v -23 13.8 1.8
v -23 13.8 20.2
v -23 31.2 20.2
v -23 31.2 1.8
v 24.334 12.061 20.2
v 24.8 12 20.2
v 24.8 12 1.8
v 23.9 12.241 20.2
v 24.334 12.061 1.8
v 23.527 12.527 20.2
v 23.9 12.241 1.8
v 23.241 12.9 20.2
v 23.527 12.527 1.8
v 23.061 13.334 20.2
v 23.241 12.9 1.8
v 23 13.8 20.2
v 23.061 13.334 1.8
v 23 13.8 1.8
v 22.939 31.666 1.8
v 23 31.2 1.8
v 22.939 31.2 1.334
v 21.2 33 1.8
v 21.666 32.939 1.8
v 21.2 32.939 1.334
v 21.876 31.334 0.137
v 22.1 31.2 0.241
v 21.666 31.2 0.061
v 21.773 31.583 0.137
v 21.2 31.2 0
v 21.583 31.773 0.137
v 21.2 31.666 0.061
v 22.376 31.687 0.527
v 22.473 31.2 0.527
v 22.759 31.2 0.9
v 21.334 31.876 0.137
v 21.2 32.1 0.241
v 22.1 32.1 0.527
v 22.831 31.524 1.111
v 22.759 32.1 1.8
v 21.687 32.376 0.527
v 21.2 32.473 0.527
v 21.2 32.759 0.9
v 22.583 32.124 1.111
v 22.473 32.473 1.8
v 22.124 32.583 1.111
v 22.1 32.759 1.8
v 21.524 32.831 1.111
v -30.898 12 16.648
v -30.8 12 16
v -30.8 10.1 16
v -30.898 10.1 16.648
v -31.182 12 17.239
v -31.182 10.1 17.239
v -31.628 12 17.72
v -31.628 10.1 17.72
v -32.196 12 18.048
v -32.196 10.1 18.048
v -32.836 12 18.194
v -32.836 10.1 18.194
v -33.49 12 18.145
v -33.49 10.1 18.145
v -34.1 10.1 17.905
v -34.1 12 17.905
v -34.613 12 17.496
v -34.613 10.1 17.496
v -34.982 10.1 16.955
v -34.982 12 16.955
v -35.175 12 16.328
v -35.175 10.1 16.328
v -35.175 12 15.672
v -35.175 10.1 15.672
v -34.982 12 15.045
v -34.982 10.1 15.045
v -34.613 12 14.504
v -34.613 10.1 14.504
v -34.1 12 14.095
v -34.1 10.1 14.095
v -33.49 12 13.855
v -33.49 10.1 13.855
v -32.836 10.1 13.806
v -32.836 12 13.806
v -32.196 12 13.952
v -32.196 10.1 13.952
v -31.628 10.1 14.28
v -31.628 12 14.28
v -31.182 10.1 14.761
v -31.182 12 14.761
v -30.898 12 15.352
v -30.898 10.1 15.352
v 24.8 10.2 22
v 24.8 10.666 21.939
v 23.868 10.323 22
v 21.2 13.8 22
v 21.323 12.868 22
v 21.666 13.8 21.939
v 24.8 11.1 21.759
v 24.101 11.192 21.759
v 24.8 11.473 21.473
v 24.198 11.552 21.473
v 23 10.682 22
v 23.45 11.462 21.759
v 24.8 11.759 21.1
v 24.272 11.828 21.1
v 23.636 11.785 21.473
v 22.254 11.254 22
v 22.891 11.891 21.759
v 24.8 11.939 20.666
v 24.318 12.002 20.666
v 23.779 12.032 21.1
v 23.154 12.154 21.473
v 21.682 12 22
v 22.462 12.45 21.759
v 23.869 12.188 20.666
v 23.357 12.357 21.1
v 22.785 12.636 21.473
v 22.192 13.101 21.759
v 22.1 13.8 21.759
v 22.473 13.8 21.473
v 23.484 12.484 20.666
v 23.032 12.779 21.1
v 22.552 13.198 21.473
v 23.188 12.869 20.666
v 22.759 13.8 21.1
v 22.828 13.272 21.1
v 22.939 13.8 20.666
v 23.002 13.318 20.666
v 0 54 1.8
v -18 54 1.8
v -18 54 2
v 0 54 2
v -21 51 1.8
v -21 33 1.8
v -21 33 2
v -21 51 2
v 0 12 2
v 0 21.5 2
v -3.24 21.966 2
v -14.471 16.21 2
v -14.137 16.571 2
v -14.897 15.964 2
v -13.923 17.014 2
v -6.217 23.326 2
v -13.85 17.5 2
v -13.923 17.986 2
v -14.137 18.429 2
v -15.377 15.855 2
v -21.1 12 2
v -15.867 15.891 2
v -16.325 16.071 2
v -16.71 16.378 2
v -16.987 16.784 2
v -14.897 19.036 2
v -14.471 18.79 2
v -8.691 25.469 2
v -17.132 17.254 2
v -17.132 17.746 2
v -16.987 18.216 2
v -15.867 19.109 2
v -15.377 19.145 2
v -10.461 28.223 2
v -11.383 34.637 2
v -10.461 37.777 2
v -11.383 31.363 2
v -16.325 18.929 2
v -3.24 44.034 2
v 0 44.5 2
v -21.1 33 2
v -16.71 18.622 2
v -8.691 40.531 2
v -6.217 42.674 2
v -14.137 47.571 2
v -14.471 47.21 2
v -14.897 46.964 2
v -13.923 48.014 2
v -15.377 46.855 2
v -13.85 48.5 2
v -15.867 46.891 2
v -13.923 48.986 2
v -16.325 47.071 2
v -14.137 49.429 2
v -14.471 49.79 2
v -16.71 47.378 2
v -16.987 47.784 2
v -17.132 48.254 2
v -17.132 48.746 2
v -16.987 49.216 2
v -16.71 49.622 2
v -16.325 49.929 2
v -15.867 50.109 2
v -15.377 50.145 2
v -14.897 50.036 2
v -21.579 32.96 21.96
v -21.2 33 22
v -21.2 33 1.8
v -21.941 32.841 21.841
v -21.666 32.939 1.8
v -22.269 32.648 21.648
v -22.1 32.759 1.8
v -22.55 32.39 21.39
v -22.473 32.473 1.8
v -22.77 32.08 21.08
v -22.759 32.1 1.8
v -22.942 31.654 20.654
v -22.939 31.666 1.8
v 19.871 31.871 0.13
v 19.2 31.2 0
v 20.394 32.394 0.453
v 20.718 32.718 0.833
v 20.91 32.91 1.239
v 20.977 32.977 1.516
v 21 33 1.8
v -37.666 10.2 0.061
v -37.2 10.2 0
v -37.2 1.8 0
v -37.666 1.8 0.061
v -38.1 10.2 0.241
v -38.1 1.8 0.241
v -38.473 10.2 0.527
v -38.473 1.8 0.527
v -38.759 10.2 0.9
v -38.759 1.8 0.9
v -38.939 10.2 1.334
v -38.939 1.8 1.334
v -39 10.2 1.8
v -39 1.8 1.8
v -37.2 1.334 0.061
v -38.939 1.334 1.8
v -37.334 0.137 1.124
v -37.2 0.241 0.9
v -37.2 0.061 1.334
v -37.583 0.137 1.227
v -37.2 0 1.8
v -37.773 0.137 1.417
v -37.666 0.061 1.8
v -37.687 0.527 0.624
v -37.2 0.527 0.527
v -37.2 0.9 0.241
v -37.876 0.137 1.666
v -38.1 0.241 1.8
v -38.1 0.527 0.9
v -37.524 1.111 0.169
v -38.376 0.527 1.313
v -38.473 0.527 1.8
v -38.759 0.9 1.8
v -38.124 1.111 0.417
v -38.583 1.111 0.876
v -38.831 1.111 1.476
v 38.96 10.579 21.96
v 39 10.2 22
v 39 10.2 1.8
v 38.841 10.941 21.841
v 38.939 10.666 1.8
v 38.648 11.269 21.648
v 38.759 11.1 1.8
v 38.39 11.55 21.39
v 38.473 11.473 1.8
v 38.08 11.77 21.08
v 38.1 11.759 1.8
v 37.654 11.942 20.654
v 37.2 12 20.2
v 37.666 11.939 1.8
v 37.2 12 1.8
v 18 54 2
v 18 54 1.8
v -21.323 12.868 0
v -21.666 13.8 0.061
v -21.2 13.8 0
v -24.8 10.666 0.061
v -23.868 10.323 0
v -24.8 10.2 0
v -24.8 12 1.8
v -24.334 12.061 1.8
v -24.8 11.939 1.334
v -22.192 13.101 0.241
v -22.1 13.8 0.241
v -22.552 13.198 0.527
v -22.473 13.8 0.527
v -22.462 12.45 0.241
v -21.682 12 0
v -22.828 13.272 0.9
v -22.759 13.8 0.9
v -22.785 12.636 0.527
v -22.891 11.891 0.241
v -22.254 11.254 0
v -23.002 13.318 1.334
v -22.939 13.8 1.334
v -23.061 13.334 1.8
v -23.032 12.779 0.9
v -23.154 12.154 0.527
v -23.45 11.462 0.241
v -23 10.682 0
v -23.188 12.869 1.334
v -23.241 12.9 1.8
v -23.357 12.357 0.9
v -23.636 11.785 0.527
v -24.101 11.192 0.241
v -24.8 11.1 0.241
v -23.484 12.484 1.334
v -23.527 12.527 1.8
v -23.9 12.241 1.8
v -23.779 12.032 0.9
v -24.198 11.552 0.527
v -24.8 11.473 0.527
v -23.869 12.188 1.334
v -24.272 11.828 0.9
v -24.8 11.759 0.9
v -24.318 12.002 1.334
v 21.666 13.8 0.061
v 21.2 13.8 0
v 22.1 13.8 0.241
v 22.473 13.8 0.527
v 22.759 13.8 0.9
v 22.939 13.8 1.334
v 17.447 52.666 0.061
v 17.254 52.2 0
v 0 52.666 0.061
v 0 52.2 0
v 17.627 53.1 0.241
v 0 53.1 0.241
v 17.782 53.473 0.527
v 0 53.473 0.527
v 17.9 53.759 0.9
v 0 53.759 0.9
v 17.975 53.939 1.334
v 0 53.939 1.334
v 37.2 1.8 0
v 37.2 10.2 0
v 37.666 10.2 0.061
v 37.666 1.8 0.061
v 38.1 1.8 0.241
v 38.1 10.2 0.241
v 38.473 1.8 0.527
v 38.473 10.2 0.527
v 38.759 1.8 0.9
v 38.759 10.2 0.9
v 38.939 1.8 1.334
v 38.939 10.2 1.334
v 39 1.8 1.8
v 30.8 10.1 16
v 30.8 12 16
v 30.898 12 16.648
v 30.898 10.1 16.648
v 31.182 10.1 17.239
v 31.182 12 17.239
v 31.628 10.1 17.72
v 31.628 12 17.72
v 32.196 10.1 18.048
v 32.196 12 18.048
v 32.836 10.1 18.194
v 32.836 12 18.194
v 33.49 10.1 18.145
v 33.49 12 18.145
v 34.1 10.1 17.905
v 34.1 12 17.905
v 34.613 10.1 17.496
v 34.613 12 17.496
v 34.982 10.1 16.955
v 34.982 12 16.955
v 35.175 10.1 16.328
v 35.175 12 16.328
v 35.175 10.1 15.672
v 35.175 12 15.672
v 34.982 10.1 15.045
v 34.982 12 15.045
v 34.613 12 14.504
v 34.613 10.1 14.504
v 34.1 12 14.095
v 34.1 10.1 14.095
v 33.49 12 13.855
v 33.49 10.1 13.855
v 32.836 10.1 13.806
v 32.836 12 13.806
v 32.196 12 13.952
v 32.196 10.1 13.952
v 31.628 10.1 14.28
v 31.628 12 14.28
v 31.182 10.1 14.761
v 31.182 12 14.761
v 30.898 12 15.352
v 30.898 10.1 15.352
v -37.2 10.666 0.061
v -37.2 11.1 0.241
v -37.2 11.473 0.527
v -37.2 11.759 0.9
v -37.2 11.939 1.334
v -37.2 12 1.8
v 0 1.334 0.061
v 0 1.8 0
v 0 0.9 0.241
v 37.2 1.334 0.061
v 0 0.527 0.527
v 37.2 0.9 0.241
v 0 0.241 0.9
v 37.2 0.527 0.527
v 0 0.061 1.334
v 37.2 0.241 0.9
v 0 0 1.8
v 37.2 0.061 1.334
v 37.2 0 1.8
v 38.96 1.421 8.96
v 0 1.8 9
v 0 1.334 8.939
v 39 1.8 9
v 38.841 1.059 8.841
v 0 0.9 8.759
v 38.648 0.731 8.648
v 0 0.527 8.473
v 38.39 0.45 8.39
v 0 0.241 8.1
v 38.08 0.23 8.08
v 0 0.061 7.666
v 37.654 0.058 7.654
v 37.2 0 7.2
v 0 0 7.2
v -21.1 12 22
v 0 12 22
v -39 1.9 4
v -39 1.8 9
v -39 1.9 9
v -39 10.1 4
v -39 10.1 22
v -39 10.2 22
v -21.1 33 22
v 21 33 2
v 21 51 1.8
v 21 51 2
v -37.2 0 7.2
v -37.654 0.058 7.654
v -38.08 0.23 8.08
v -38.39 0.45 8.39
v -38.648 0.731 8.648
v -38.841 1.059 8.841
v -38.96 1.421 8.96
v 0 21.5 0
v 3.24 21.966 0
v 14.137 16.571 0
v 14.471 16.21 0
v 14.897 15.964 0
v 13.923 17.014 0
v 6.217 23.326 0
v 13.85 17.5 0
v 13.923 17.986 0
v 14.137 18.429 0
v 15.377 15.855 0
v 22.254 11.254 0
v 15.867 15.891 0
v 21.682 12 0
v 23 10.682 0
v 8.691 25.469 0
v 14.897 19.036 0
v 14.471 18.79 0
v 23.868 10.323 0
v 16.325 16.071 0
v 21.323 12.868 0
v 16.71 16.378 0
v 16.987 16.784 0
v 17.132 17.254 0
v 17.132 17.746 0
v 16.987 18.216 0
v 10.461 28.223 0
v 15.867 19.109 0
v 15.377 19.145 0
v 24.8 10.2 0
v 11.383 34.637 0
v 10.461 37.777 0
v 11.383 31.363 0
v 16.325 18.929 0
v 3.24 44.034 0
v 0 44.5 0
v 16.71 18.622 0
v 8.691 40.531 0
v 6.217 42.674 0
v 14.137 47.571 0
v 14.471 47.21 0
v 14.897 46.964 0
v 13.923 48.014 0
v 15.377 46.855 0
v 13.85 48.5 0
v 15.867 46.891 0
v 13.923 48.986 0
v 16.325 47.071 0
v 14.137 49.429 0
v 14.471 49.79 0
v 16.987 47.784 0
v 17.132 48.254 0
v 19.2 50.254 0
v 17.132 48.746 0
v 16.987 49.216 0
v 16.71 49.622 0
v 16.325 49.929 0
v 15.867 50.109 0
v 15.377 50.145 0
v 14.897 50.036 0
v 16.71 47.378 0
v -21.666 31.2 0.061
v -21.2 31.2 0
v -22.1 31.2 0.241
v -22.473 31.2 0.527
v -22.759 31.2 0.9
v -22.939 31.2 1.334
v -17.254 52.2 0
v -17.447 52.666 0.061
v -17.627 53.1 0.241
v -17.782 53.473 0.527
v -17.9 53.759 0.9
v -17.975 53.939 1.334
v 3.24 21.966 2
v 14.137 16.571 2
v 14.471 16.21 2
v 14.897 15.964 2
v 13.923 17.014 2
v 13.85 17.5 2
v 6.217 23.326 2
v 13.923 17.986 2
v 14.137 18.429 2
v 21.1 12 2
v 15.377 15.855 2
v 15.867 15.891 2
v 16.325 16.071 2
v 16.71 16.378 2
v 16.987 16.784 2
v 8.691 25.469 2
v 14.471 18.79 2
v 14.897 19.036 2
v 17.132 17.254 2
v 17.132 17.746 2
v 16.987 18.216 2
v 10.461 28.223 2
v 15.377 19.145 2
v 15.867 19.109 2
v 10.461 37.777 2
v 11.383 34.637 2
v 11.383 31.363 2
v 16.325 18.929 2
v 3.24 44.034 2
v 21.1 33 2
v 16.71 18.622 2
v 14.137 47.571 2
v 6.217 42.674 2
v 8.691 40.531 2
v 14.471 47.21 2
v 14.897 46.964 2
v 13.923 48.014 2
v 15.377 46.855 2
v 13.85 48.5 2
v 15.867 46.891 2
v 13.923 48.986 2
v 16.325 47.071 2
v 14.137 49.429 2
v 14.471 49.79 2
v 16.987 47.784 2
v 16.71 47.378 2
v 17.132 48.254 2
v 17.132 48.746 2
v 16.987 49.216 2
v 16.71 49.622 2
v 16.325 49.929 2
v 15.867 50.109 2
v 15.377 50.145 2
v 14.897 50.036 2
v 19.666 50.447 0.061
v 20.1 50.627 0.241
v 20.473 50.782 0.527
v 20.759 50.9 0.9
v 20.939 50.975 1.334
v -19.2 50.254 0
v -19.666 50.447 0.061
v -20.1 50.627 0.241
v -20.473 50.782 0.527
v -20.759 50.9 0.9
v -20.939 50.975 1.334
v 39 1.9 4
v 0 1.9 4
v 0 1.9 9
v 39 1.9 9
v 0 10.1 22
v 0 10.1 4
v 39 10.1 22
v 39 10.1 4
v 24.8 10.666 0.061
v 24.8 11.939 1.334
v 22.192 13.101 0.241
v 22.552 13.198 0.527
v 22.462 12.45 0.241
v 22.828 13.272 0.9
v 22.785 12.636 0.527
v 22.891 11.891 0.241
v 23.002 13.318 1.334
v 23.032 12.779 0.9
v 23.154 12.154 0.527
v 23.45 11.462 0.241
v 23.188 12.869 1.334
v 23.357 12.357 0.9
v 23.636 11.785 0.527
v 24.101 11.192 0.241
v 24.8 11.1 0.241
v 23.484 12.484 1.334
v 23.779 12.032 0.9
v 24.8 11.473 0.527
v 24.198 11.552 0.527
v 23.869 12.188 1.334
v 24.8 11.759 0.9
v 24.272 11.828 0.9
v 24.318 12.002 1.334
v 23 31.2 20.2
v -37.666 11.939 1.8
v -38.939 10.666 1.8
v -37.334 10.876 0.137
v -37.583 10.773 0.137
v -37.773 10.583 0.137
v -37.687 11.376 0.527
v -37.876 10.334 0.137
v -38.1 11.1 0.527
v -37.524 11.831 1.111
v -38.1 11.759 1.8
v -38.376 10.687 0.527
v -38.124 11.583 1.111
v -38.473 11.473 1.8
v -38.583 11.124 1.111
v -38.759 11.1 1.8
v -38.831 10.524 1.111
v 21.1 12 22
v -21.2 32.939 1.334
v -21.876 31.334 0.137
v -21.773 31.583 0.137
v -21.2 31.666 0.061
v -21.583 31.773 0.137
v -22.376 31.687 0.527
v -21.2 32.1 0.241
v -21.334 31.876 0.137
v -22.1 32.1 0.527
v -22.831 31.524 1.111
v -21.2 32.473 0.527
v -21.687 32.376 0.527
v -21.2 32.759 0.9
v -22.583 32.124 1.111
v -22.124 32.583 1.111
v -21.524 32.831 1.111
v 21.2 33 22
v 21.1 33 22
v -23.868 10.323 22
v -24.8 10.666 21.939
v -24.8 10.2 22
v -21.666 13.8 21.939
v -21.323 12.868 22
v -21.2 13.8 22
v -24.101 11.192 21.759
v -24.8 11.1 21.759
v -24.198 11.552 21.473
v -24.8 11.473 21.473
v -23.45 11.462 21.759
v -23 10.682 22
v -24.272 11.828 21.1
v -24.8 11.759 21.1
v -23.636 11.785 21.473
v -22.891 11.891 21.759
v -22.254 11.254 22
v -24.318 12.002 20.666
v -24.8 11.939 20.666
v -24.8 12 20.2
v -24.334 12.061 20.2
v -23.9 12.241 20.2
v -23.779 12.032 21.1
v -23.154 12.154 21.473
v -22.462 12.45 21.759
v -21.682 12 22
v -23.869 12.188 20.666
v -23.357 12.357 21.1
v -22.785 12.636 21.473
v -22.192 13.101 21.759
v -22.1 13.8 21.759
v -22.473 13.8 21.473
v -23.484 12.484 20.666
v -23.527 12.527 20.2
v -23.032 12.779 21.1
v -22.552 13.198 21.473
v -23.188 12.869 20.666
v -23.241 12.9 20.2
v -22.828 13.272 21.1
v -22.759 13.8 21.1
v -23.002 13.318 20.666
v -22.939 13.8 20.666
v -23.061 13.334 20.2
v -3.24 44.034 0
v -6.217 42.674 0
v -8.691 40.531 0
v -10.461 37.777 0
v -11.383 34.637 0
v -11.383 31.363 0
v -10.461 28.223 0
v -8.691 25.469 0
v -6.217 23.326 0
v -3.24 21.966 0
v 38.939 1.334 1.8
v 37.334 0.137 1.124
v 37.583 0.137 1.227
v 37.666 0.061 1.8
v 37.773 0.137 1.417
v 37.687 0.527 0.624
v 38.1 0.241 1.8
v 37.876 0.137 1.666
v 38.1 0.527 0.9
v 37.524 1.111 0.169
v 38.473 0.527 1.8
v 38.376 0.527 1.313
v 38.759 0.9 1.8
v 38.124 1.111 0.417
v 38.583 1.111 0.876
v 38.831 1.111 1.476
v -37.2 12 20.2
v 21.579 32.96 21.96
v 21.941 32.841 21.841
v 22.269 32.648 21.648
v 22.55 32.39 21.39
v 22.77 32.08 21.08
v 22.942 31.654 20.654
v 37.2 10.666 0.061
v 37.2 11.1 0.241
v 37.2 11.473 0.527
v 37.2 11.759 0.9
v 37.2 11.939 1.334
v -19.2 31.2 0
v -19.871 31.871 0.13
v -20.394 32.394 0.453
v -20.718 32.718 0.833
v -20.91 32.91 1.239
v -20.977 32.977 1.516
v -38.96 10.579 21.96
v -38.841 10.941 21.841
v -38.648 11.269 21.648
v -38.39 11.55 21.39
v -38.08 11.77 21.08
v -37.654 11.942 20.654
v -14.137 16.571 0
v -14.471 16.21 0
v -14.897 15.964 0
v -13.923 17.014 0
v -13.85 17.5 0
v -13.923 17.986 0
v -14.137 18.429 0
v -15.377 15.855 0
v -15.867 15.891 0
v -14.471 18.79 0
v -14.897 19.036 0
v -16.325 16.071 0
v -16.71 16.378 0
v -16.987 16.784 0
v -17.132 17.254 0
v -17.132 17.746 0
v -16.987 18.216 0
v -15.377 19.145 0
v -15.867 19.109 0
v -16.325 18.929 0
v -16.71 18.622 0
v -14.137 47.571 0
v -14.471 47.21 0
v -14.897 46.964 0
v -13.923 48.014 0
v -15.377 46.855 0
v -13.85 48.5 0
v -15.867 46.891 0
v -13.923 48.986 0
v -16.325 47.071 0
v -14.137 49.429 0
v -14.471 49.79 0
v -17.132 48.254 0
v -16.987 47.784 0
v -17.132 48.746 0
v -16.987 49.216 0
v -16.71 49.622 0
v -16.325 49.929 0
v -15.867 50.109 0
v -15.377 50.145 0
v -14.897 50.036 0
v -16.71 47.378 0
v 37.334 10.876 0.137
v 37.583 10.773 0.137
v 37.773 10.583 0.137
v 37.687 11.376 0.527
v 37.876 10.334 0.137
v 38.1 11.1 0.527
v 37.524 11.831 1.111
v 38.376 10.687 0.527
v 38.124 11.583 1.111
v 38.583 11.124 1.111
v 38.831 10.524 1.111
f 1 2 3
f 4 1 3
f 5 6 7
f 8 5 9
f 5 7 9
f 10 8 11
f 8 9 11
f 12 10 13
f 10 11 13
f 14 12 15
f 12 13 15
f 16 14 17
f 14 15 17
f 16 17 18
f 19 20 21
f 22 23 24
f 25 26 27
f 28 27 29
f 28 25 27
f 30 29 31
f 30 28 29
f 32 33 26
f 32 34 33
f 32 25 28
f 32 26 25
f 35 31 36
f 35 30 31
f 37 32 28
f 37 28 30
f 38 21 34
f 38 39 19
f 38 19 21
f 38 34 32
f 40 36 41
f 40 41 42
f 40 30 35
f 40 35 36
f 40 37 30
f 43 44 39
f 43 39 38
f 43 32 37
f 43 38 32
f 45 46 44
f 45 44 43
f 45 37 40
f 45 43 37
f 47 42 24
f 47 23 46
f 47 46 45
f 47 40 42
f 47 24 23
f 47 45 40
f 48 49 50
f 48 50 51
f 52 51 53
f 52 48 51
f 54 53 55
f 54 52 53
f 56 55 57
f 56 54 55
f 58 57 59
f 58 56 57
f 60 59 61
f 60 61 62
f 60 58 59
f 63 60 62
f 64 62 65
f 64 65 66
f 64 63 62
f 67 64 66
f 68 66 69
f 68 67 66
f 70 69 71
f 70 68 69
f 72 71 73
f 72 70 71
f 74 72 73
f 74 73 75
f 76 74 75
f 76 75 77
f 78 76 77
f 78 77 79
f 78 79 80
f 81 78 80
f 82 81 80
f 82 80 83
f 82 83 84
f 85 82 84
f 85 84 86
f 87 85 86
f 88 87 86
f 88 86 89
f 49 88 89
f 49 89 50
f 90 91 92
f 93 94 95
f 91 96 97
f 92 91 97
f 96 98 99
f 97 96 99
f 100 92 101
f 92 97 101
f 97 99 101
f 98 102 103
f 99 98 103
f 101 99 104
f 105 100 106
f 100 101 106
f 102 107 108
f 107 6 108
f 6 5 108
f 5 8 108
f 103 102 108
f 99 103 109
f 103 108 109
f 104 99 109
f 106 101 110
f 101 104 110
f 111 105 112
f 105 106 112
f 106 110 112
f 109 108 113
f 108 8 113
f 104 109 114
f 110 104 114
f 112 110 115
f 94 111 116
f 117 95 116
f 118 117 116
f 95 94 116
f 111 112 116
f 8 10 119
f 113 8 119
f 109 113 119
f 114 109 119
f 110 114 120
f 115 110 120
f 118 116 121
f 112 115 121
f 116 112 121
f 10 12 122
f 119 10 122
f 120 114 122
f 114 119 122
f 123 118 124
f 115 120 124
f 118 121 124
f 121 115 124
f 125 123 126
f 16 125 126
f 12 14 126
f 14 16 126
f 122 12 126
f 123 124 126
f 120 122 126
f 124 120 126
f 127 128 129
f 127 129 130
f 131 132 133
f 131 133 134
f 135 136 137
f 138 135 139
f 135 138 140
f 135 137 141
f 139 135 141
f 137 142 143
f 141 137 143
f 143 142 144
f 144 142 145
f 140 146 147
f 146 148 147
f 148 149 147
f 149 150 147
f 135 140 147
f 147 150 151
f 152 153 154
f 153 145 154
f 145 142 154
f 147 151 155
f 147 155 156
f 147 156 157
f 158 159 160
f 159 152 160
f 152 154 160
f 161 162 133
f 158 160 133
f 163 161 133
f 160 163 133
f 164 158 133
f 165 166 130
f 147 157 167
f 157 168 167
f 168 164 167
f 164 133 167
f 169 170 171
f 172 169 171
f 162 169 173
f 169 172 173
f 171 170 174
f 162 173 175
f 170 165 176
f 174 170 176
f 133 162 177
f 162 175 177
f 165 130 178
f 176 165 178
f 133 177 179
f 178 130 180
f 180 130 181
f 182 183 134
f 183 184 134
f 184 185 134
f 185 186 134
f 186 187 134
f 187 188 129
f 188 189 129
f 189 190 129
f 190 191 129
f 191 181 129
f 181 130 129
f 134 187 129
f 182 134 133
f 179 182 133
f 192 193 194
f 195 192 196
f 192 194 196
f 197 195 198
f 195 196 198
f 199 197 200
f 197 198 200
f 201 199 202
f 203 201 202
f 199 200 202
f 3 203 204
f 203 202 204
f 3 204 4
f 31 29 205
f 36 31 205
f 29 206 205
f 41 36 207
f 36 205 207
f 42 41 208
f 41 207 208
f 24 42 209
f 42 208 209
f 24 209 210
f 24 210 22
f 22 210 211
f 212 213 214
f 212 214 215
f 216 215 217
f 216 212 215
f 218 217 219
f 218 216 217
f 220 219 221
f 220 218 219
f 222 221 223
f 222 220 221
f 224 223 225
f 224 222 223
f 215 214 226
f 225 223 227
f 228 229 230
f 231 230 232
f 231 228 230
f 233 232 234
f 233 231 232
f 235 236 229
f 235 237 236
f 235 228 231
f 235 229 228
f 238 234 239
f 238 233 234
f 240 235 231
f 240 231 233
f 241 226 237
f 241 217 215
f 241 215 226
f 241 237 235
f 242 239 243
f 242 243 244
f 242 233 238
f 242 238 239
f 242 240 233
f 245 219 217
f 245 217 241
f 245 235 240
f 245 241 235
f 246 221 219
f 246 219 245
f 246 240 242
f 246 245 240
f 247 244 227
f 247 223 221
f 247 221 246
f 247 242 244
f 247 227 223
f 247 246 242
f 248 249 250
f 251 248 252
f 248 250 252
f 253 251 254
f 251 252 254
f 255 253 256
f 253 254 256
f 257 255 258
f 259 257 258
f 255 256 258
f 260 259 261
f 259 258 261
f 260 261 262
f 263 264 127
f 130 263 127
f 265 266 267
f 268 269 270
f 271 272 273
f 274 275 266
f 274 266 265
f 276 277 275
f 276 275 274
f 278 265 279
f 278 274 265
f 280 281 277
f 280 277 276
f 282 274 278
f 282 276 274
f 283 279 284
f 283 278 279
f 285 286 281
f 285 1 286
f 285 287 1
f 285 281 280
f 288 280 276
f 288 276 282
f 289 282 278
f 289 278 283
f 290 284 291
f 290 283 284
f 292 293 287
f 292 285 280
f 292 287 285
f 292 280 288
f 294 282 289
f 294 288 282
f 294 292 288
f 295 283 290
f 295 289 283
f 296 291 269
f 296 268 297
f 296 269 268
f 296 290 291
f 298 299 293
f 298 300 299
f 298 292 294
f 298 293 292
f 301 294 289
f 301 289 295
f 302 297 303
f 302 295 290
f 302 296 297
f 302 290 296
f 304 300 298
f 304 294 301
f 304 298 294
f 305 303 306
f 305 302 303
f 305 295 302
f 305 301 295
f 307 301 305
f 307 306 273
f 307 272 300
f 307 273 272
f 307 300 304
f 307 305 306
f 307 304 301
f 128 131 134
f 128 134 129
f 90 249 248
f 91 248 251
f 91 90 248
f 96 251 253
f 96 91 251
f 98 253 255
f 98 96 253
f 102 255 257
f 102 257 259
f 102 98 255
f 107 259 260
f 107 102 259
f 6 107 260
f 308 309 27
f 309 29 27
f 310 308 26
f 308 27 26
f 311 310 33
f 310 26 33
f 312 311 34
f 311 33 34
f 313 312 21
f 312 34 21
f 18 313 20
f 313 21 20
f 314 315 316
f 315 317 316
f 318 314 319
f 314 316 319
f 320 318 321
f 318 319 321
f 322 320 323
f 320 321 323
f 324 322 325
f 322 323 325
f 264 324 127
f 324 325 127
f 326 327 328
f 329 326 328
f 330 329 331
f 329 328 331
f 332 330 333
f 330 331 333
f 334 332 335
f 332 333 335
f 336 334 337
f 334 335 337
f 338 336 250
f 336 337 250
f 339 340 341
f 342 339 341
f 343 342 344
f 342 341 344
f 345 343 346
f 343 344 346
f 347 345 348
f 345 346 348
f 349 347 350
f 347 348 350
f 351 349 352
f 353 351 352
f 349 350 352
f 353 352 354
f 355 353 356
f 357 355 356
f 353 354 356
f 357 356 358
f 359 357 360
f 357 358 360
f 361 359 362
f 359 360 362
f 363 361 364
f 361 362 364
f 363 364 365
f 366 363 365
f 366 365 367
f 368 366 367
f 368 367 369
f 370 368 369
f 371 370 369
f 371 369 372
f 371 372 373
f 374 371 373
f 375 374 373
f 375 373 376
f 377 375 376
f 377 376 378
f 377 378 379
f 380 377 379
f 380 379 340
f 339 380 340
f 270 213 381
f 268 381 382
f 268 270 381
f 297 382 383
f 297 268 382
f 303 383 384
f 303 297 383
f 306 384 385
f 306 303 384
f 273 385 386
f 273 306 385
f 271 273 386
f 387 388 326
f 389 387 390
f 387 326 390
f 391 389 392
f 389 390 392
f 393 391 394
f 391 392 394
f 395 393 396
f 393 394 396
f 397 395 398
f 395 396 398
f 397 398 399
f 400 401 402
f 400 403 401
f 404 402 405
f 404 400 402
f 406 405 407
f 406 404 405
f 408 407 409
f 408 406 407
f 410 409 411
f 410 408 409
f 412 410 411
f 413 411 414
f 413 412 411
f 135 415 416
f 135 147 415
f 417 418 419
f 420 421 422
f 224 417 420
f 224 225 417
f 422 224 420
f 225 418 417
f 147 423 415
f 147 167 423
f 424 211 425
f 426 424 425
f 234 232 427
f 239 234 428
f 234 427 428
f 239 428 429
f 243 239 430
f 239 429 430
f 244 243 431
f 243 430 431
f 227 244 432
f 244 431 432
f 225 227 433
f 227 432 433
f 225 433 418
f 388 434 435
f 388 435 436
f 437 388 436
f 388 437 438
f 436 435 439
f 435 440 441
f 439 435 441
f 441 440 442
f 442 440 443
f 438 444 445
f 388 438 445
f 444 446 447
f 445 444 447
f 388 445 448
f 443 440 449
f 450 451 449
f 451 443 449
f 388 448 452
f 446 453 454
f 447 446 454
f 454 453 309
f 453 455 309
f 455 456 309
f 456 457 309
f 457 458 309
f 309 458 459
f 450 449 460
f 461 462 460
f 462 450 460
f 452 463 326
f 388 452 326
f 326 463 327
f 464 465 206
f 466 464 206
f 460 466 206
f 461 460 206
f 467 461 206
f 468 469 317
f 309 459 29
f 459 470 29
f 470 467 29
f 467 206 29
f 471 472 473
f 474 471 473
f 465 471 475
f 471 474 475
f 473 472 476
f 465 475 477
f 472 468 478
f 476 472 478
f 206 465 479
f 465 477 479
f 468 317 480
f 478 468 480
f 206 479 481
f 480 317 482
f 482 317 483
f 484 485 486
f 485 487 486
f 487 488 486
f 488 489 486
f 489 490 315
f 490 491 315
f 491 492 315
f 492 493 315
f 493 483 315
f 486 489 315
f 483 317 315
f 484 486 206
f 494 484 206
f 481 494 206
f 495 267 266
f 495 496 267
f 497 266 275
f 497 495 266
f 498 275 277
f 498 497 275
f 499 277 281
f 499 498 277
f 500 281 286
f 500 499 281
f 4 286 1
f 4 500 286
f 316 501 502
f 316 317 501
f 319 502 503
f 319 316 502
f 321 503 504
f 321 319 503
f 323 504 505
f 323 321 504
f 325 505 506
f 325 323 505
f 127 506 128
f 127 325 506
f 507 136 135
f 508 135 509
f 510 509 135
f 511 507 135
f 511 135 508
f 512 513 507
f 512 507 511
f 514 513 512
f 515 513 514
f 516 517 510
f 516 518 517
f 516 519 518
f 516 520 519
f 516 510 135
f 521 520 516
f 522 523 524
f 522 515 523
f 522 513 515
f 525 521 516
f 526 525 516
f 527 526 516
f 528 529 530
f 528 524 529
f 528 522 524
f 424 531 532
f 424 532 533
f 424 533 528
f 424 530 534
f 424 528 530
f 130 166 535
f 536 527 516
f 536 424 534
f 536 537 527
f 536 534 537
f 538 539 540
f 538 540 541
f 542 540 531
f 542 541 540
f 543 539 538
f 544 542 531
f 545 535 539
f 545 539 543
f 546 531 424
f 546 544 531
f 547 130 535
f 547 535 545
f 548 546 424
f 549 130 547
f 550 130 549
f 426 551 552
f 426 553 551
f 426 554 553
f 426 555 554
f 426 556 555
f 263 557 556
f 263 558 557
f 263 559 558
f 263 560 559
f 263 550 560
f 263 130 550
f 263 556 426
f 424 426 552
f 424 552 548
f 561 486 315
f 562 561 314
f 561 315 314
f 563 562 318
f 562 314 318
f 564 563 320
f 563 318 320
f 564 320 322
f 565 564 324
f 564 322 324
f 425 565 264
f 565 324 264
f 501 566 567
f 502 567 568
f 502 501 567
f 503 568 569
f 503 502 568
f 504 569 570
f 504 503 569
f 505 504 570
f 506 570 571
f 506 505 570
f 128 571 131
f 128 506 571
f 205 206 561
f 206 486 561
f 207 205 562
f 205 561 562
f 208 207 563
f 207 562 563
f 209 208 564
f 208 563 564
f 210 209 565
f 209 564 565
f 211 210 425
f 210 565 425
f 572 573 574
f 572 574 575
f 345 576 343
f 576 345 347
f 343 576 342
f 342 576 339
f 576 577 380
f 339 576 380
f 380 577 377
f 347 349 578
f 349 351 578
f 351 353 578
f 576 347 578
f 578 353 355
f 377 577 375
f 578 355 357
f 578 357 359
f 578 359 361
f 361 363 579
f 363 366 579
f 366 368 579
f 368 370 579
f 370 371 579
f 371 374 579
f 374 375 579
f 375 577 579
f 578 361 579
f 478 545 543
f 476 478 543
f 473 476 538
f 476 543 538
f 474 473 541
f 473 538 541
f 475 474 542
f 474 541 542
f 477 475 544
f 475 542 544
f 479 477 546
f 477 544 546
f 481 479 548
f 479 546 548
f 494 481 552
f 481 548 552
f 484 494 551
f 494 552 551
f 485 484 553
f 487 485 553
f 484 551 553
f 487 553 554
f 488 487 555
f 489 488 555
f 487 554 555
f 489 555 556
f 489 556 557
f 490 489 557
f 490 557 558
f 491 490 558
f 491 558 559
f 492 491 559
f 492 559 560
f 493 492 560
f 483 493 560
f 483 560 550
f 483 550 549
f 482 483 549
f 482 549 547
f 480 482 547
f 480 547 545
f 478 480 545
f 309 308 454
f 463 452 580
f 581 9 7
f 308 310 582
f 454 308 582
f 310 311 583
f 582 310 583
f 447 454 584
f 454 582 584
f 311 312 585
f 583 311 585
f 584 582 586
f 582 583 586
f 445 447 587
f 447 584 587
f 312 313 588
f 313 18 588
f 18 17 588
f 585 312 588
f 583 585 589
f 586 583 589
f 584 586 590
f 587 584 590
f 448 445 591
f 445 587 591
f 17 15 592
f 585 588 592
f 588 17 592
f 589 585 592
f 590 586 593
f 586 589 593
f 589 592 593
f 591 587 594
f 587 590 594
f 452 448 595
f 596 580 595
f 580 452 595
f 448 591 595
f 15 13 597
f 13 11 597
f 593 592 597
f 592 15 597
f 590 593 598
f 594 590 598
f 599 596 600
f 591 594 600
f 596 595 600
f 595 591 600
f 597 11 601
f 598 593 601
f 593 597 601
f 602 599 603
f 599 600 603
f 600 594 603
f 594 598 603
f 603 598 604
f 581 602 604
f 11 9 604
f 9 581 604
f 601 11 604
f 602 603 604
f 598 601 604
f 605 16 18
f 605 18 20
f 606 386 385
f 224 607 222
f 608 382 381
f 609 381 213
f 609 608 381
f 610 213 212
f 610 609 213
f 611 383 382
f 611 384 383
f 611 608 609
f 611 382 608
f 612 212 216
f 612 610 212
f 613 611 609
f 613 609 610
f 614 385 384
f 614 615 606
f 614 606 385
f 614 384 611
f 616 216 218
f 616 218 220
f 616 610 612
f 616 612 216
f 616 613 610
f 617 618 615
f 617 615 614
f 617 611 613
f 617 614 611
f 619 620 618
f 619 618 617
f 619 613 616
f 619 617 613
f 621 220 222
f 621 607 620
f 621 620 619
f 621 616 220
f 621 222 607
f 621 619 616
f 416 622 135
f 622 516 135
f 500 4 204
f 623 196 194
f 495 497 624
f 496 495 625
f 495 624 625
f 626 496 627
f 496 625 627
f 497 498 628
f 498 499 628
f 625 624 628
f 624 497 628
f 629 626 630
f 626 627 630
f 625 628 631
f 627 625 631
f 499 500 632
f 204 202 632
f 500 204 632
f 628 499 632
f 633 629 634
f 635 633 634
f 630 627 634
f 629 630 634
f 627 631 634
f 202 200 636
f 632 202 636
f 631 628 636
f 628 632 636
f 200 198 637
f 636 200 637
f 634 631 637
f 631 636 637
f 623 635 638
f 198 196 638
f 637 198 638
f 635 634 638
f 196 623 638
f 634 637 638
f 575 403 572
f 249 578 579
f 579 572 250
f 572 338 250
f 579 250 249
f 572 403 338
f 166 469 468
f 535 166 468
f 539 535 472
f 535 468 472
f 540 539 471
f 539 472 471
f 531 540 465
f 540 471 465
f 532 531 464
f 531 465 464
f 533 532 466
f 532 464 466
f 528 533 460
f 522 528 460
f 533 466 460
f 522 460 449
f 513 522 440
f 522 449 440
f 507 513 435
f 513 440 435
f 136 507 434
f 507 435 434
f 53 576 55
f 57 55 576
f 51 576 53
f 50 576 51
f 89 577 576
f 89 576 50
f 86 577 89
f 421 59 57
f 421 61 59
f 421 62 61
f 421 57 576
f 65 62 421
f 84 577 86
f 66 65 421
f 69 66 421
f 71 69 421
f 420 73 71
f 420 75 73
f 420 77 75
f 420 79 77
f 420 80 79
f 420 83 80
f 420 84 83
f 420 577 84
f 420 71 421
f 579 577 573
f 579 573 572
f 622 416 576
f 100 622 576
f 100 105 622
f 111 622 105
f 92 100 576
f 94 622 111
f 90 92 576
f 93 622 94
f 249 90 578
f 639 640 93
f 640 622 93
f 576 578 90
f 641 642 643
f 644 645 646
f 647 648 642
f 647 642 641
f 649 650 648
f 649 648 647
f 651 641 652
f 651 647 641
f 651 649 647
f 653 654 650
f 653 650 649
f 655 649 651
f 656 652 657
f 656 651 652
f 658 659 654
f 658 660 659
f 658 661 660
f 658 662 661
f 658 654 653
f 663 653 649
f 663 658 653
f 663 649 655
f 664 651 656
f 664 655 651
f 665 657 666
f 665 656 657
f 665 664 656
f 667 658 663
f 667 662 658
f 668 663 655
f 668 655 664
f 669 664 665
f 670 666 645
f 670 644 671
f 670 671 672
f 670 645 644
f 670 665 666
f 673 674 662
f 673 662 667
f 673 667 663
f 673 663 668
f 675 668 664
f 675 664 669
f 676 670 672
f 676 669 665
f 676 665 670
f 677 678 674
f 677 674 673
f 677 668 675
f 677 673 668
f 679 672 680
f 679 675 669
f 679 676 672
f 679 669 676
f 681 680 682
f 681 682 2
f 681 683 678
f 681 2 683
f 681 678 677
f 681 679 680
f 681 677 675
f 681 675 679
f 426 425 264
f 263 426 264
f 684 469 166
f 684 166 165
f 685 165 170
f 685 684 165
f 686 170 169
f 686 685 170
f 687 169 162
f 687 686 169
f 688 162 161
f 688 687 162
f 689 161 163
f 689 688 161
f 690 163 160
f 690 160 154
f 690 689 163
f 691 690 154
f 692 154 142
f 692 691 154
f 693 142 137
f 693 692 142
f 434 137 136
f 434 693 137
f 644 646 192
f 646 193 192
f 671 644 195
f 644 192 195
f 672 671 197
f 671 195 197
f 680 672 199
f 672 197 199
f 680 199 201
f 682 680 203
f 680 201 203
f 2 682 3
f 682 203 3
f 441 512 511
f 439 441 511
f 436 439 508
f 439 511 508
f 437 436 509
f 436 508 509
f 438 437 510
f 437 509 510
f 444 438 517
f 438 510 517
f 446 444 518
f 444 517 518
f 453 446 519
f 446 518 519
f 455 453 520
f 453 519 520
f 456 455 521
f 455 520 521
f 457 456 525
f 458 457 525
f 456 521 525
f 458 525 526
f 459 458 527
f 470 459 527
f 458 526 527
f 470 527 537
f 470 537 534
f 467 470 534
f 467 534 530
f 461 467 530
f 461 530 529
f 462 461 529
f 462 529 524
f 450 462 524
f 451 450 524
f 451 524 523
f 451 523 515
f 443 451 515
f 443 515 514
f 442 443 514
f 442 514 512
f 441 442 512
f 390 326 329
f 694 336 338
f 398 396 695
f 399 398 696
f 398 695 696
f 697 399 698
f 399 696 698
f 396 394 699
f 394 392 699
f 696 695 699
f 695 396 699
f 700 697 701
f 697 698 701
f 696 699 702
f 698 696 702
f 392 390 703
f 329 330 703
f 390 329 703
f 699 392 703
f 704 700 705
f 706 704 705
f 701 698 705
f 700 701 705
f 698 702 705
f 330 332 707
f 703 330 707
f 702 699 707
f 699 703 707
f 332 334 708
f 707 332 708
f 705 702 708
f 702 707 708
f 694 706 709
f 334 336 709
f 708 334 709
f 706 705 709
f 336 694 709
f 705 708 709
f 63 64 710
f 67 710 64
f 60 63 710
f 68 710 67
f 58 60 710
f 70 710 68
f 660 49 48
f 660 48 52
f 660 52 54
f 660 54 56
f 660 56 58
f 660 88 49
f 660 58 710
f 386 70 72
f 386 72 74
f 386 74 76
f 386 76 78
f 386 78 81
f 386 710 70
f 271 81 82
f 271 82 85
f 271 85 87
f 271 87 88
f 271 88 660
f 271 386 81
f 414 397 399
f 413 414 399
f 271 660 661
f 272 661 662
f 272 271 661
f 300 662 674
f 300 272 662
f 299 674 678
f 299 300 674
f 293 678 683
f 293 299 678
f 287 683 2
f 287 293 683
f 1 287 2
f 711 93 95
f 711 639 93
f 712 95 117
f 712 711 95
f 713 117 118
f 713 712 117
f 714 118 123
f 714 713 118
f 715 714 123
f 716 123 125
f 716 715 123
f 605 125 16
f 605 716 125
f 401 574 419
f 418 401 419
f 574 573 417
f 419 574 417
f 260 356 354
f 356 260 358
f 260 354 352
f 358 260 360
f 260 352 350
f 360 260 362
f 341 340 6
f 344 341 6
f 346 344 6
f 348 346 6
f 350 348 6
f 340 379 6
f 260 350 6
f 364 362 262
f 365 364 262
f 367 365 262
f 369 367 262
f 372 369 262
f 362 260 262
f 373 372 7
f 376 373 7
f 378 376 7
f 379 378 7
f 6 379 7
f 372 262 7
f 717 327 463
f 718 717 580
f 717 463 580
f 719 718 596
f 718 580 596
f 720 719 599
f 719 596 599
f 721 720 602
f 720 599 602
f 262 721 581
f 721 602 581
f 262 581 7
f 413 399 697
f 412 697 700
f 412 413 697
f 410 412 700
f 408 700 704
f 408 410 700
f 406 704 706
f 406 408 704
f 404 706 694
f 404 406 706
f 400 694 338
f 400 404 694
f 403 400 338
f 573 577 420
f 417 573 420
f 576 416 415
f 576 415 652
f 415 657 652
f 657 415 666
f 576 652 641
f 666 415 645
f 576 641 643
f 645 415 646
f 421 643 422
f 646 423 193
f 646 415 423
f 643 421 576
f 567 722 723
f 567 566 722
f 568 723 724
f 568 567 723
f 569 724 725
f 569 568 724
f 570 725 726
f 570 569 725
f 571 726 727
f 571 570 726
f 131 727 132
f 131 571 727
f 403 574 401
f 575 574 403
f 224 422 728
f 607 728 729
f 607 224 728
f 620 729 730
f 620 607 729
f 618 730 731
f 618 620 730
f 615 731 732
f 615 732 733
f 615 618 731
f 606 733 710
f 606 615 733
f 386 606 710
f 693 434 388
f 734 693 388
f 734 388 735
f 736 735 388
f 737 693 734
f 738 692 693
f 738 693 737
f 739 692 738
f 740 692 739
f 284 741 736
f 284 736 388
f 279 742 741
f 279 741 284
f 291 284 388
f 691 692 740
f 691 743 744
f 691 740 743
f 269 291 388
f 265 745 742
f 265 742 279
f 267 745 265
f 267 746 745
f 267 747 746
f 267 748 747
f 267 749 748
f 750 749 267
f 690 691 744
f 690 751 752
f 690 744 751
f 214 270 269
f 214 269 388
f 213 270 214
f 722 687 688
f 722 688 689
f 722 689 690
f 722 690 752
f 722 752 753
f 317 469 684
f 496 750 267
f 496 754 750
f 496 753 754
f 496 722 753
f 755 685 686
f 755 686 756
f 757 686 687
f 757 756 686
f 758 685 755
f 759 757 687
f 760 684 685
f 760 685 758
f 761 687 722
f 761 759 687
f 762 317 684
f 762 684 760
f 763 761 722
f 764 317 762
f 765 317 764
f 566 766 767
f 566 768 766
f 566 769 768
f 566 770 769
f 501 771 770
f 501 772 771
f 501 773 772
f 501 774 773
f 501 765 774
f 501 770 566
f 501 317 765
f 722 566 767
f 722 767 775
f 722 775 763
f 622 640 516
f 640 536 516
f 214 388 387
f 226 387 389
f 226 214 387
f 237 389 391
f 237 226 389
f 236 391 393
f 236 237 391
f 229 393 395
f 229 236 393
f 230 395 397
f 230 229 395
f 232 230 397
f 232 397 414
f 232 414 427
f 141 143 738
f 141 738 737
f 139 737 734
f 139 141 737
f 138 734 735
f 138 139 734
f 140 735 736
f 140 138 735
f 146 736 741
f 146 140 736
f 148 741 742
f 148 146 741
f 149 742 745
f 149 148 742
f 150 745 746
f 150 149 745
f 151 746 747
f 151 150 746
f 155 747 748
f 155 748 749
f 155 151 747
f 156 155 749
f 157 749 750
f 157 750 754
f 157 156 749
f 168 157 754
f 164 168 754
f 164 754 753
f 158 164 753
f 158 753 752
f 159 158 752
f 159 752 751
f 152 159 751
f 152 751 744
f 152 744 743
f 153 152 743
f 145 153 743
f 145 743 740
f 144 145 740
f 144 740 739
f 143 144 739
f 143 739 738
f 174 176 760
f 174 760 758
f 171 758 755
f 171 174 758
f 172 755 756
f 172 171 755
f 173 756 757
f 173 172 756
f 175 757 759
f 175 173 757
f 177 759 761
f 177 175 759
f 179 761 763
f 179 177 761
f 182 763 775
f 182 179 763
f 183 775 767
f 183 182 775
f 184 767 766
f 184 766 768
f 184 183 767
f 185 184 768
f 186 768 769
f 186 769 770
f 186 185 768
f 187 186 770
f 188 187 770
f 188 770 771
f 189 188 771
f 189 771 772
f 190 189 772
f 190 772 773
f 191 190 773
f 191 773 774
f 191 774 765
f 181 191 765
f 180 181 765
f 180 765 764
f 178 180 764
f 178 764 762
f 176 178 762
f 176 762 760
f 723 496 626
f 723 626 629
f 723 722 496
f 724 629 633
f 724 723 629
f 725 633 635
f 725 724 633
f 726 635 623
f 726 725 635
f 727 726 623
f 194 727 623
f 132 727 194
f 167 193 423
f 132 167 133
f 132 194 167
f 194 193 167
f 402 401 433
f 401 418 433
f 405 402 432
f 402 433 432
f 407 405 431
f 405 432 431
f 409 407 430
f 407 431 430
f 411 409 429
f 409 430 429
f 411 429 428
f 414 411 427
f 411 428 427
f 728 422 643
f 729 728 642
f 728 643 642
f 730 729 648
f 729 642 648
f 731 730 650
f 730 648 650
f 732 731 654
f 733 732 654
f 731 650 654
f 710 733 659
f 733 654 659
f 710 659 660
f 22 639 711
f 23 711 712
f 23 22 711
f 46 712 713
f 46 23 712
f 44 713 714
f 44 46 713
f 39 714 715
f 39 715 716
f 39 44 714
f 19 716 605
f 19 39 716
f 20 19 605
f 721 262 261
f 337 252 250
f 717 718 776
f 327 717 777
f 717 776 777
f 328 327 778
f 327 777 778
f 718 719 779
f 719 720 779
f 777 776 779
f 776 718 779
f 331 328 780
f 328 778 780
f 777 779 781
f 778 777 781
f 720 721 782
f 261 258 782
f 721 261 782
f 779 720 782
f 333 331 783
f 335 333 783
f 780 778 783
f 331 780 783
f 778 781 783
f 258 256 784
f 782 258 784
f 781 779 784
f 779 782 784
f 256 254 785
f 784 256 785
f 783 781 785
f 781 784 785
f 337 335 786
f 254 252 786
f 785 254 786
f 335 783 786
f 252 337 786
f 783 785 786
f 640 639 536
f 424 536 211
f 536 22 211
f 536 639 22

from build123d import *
from build123d import SkipClean  # not in build123d's __all__

# Parameters (mm, degrees)
F1_DEPTH  = 2
F3_DEPTH  = 2
F5_DEPTH  = 18
F6_W      = 39
F6_H      = 1.9
F7_DEPTH  = 5
F9_D      = 3.3
F9_DEPTH  = 8
F9_TIP    = 0.9914200214
F11_D     = 4.4
F11_DEPTH = 8
F11_TIP   = 1.3218933619
F12_R     = 1.8


with BuildPart() as f1:
    # F0 (on Top) → F1 (new body)
    with BuildSketch(Plane.XY):
        with BuildLine():
            Line((0, 21.5), (0, 0))
            Line((0, 0), (39, 0))
            Line((39, 0), (39, 12))
            Line((39, 12), (23, 12))
            Line((23, 12), (23, 33))
            Line((23, 33), (21, 33))
            Line((21, 33), (21, 51))
            Line((21, 51), (18, 54))
            Line((18, 54), (0, 54))
            Line((0, 54), (0, 44.5))
            ThreePointArc((0, 44.5), (11.5, 33), (0, 21.5))
        make_face()
    extrude(amount=F1_DEPTH)

    # F2 (on face) → F3 (join)
    with BuildSketch(Plane.XY.offset(2)):
        Polygon((0, 12), (0, 0), (39, 0), (39, 12), (23, 12), (23, 33), (21.1, 33), (21.1, 12), align=None)
    extrude(amount=F3_DEPTH)

    # F4 (on face) → F5 (join)
    with BuildSketch(Plane.XY.offset(4)):
        Polygon((23, 33), (21.1, 33), (21.1, 12), (0, 12), (0, 10.1), (39, 10.1), (39, 12), (23, 12), align=None)
    extrude(amount=F5_DEPTH)

    # F6 (on face) → F7 (join)
    with BuildSketch(Plane.XY.offset(4)):
        with Locations((19.5, 0.95)):
            Rectangle(F6_W, F6_H)
    extrude(amount=F7_DEPTH)

    # F9
    with Locations(Plane(origin=(0, 0, 0), x_dir=(1, 0, 0), z_dir=(0, 0, -1))):
        with Locations((15.5, -17.5), (15.5, -48.5)):
            Hole(F9_D / 2, depth=F9_DEPTH)
            with Locations((0, 0, -(F9_DEPTH + F9_TIP / 2))):  # 118° drill point
                Cone(0, F9_D / 2, F9_TIP, mode=Mode.SUBTRACT)

    # F11
    with Locations(Plane.XZ.offset(-10.1)):
        with Locations((33, 16)):
            Hole(F11_D / 2, depth=F11_DEPTH)
            with Locations((0, 0, -(F11_DEPTH + F11_TIP / 2))):  # 118° drill point
                Cone(0, F11_D / 2, F11_TIP, mode=Mode.SUBTRACT)

    # F12
    f12_edges = [f1.edges().sort_by_distance(p)[0] for p in [
        (31, 12, 22),
        (39, 12, 11),
        (23, 33, 11),
        (23, 22.5, 22),
        (23, 22.5, 0),
        (9, 54, 0),
        (31, 12, 0),
        (23, 12, 11),
        (39, 6, 0),
        (19.5, 0, 9),
        (19.5, 0, 0),
        (39, 0, 4.5),
        (21, 42, 0),
        (22, 33, 0),
        (19.5, 52.5, 0),
    ]]
    fillet(f12_edges, radius=F12_R)

    # F13: F1 across plane


with BuildPart() as f1_1:
    add(f1.part, clean=False)
    with SkipClean():  # cleaning this boolean's faces spoils the solid; the shape is the same uncleaned
        add(f1.part.mirror(Plane.YZ), clean=False)


solid = f1_1.part
